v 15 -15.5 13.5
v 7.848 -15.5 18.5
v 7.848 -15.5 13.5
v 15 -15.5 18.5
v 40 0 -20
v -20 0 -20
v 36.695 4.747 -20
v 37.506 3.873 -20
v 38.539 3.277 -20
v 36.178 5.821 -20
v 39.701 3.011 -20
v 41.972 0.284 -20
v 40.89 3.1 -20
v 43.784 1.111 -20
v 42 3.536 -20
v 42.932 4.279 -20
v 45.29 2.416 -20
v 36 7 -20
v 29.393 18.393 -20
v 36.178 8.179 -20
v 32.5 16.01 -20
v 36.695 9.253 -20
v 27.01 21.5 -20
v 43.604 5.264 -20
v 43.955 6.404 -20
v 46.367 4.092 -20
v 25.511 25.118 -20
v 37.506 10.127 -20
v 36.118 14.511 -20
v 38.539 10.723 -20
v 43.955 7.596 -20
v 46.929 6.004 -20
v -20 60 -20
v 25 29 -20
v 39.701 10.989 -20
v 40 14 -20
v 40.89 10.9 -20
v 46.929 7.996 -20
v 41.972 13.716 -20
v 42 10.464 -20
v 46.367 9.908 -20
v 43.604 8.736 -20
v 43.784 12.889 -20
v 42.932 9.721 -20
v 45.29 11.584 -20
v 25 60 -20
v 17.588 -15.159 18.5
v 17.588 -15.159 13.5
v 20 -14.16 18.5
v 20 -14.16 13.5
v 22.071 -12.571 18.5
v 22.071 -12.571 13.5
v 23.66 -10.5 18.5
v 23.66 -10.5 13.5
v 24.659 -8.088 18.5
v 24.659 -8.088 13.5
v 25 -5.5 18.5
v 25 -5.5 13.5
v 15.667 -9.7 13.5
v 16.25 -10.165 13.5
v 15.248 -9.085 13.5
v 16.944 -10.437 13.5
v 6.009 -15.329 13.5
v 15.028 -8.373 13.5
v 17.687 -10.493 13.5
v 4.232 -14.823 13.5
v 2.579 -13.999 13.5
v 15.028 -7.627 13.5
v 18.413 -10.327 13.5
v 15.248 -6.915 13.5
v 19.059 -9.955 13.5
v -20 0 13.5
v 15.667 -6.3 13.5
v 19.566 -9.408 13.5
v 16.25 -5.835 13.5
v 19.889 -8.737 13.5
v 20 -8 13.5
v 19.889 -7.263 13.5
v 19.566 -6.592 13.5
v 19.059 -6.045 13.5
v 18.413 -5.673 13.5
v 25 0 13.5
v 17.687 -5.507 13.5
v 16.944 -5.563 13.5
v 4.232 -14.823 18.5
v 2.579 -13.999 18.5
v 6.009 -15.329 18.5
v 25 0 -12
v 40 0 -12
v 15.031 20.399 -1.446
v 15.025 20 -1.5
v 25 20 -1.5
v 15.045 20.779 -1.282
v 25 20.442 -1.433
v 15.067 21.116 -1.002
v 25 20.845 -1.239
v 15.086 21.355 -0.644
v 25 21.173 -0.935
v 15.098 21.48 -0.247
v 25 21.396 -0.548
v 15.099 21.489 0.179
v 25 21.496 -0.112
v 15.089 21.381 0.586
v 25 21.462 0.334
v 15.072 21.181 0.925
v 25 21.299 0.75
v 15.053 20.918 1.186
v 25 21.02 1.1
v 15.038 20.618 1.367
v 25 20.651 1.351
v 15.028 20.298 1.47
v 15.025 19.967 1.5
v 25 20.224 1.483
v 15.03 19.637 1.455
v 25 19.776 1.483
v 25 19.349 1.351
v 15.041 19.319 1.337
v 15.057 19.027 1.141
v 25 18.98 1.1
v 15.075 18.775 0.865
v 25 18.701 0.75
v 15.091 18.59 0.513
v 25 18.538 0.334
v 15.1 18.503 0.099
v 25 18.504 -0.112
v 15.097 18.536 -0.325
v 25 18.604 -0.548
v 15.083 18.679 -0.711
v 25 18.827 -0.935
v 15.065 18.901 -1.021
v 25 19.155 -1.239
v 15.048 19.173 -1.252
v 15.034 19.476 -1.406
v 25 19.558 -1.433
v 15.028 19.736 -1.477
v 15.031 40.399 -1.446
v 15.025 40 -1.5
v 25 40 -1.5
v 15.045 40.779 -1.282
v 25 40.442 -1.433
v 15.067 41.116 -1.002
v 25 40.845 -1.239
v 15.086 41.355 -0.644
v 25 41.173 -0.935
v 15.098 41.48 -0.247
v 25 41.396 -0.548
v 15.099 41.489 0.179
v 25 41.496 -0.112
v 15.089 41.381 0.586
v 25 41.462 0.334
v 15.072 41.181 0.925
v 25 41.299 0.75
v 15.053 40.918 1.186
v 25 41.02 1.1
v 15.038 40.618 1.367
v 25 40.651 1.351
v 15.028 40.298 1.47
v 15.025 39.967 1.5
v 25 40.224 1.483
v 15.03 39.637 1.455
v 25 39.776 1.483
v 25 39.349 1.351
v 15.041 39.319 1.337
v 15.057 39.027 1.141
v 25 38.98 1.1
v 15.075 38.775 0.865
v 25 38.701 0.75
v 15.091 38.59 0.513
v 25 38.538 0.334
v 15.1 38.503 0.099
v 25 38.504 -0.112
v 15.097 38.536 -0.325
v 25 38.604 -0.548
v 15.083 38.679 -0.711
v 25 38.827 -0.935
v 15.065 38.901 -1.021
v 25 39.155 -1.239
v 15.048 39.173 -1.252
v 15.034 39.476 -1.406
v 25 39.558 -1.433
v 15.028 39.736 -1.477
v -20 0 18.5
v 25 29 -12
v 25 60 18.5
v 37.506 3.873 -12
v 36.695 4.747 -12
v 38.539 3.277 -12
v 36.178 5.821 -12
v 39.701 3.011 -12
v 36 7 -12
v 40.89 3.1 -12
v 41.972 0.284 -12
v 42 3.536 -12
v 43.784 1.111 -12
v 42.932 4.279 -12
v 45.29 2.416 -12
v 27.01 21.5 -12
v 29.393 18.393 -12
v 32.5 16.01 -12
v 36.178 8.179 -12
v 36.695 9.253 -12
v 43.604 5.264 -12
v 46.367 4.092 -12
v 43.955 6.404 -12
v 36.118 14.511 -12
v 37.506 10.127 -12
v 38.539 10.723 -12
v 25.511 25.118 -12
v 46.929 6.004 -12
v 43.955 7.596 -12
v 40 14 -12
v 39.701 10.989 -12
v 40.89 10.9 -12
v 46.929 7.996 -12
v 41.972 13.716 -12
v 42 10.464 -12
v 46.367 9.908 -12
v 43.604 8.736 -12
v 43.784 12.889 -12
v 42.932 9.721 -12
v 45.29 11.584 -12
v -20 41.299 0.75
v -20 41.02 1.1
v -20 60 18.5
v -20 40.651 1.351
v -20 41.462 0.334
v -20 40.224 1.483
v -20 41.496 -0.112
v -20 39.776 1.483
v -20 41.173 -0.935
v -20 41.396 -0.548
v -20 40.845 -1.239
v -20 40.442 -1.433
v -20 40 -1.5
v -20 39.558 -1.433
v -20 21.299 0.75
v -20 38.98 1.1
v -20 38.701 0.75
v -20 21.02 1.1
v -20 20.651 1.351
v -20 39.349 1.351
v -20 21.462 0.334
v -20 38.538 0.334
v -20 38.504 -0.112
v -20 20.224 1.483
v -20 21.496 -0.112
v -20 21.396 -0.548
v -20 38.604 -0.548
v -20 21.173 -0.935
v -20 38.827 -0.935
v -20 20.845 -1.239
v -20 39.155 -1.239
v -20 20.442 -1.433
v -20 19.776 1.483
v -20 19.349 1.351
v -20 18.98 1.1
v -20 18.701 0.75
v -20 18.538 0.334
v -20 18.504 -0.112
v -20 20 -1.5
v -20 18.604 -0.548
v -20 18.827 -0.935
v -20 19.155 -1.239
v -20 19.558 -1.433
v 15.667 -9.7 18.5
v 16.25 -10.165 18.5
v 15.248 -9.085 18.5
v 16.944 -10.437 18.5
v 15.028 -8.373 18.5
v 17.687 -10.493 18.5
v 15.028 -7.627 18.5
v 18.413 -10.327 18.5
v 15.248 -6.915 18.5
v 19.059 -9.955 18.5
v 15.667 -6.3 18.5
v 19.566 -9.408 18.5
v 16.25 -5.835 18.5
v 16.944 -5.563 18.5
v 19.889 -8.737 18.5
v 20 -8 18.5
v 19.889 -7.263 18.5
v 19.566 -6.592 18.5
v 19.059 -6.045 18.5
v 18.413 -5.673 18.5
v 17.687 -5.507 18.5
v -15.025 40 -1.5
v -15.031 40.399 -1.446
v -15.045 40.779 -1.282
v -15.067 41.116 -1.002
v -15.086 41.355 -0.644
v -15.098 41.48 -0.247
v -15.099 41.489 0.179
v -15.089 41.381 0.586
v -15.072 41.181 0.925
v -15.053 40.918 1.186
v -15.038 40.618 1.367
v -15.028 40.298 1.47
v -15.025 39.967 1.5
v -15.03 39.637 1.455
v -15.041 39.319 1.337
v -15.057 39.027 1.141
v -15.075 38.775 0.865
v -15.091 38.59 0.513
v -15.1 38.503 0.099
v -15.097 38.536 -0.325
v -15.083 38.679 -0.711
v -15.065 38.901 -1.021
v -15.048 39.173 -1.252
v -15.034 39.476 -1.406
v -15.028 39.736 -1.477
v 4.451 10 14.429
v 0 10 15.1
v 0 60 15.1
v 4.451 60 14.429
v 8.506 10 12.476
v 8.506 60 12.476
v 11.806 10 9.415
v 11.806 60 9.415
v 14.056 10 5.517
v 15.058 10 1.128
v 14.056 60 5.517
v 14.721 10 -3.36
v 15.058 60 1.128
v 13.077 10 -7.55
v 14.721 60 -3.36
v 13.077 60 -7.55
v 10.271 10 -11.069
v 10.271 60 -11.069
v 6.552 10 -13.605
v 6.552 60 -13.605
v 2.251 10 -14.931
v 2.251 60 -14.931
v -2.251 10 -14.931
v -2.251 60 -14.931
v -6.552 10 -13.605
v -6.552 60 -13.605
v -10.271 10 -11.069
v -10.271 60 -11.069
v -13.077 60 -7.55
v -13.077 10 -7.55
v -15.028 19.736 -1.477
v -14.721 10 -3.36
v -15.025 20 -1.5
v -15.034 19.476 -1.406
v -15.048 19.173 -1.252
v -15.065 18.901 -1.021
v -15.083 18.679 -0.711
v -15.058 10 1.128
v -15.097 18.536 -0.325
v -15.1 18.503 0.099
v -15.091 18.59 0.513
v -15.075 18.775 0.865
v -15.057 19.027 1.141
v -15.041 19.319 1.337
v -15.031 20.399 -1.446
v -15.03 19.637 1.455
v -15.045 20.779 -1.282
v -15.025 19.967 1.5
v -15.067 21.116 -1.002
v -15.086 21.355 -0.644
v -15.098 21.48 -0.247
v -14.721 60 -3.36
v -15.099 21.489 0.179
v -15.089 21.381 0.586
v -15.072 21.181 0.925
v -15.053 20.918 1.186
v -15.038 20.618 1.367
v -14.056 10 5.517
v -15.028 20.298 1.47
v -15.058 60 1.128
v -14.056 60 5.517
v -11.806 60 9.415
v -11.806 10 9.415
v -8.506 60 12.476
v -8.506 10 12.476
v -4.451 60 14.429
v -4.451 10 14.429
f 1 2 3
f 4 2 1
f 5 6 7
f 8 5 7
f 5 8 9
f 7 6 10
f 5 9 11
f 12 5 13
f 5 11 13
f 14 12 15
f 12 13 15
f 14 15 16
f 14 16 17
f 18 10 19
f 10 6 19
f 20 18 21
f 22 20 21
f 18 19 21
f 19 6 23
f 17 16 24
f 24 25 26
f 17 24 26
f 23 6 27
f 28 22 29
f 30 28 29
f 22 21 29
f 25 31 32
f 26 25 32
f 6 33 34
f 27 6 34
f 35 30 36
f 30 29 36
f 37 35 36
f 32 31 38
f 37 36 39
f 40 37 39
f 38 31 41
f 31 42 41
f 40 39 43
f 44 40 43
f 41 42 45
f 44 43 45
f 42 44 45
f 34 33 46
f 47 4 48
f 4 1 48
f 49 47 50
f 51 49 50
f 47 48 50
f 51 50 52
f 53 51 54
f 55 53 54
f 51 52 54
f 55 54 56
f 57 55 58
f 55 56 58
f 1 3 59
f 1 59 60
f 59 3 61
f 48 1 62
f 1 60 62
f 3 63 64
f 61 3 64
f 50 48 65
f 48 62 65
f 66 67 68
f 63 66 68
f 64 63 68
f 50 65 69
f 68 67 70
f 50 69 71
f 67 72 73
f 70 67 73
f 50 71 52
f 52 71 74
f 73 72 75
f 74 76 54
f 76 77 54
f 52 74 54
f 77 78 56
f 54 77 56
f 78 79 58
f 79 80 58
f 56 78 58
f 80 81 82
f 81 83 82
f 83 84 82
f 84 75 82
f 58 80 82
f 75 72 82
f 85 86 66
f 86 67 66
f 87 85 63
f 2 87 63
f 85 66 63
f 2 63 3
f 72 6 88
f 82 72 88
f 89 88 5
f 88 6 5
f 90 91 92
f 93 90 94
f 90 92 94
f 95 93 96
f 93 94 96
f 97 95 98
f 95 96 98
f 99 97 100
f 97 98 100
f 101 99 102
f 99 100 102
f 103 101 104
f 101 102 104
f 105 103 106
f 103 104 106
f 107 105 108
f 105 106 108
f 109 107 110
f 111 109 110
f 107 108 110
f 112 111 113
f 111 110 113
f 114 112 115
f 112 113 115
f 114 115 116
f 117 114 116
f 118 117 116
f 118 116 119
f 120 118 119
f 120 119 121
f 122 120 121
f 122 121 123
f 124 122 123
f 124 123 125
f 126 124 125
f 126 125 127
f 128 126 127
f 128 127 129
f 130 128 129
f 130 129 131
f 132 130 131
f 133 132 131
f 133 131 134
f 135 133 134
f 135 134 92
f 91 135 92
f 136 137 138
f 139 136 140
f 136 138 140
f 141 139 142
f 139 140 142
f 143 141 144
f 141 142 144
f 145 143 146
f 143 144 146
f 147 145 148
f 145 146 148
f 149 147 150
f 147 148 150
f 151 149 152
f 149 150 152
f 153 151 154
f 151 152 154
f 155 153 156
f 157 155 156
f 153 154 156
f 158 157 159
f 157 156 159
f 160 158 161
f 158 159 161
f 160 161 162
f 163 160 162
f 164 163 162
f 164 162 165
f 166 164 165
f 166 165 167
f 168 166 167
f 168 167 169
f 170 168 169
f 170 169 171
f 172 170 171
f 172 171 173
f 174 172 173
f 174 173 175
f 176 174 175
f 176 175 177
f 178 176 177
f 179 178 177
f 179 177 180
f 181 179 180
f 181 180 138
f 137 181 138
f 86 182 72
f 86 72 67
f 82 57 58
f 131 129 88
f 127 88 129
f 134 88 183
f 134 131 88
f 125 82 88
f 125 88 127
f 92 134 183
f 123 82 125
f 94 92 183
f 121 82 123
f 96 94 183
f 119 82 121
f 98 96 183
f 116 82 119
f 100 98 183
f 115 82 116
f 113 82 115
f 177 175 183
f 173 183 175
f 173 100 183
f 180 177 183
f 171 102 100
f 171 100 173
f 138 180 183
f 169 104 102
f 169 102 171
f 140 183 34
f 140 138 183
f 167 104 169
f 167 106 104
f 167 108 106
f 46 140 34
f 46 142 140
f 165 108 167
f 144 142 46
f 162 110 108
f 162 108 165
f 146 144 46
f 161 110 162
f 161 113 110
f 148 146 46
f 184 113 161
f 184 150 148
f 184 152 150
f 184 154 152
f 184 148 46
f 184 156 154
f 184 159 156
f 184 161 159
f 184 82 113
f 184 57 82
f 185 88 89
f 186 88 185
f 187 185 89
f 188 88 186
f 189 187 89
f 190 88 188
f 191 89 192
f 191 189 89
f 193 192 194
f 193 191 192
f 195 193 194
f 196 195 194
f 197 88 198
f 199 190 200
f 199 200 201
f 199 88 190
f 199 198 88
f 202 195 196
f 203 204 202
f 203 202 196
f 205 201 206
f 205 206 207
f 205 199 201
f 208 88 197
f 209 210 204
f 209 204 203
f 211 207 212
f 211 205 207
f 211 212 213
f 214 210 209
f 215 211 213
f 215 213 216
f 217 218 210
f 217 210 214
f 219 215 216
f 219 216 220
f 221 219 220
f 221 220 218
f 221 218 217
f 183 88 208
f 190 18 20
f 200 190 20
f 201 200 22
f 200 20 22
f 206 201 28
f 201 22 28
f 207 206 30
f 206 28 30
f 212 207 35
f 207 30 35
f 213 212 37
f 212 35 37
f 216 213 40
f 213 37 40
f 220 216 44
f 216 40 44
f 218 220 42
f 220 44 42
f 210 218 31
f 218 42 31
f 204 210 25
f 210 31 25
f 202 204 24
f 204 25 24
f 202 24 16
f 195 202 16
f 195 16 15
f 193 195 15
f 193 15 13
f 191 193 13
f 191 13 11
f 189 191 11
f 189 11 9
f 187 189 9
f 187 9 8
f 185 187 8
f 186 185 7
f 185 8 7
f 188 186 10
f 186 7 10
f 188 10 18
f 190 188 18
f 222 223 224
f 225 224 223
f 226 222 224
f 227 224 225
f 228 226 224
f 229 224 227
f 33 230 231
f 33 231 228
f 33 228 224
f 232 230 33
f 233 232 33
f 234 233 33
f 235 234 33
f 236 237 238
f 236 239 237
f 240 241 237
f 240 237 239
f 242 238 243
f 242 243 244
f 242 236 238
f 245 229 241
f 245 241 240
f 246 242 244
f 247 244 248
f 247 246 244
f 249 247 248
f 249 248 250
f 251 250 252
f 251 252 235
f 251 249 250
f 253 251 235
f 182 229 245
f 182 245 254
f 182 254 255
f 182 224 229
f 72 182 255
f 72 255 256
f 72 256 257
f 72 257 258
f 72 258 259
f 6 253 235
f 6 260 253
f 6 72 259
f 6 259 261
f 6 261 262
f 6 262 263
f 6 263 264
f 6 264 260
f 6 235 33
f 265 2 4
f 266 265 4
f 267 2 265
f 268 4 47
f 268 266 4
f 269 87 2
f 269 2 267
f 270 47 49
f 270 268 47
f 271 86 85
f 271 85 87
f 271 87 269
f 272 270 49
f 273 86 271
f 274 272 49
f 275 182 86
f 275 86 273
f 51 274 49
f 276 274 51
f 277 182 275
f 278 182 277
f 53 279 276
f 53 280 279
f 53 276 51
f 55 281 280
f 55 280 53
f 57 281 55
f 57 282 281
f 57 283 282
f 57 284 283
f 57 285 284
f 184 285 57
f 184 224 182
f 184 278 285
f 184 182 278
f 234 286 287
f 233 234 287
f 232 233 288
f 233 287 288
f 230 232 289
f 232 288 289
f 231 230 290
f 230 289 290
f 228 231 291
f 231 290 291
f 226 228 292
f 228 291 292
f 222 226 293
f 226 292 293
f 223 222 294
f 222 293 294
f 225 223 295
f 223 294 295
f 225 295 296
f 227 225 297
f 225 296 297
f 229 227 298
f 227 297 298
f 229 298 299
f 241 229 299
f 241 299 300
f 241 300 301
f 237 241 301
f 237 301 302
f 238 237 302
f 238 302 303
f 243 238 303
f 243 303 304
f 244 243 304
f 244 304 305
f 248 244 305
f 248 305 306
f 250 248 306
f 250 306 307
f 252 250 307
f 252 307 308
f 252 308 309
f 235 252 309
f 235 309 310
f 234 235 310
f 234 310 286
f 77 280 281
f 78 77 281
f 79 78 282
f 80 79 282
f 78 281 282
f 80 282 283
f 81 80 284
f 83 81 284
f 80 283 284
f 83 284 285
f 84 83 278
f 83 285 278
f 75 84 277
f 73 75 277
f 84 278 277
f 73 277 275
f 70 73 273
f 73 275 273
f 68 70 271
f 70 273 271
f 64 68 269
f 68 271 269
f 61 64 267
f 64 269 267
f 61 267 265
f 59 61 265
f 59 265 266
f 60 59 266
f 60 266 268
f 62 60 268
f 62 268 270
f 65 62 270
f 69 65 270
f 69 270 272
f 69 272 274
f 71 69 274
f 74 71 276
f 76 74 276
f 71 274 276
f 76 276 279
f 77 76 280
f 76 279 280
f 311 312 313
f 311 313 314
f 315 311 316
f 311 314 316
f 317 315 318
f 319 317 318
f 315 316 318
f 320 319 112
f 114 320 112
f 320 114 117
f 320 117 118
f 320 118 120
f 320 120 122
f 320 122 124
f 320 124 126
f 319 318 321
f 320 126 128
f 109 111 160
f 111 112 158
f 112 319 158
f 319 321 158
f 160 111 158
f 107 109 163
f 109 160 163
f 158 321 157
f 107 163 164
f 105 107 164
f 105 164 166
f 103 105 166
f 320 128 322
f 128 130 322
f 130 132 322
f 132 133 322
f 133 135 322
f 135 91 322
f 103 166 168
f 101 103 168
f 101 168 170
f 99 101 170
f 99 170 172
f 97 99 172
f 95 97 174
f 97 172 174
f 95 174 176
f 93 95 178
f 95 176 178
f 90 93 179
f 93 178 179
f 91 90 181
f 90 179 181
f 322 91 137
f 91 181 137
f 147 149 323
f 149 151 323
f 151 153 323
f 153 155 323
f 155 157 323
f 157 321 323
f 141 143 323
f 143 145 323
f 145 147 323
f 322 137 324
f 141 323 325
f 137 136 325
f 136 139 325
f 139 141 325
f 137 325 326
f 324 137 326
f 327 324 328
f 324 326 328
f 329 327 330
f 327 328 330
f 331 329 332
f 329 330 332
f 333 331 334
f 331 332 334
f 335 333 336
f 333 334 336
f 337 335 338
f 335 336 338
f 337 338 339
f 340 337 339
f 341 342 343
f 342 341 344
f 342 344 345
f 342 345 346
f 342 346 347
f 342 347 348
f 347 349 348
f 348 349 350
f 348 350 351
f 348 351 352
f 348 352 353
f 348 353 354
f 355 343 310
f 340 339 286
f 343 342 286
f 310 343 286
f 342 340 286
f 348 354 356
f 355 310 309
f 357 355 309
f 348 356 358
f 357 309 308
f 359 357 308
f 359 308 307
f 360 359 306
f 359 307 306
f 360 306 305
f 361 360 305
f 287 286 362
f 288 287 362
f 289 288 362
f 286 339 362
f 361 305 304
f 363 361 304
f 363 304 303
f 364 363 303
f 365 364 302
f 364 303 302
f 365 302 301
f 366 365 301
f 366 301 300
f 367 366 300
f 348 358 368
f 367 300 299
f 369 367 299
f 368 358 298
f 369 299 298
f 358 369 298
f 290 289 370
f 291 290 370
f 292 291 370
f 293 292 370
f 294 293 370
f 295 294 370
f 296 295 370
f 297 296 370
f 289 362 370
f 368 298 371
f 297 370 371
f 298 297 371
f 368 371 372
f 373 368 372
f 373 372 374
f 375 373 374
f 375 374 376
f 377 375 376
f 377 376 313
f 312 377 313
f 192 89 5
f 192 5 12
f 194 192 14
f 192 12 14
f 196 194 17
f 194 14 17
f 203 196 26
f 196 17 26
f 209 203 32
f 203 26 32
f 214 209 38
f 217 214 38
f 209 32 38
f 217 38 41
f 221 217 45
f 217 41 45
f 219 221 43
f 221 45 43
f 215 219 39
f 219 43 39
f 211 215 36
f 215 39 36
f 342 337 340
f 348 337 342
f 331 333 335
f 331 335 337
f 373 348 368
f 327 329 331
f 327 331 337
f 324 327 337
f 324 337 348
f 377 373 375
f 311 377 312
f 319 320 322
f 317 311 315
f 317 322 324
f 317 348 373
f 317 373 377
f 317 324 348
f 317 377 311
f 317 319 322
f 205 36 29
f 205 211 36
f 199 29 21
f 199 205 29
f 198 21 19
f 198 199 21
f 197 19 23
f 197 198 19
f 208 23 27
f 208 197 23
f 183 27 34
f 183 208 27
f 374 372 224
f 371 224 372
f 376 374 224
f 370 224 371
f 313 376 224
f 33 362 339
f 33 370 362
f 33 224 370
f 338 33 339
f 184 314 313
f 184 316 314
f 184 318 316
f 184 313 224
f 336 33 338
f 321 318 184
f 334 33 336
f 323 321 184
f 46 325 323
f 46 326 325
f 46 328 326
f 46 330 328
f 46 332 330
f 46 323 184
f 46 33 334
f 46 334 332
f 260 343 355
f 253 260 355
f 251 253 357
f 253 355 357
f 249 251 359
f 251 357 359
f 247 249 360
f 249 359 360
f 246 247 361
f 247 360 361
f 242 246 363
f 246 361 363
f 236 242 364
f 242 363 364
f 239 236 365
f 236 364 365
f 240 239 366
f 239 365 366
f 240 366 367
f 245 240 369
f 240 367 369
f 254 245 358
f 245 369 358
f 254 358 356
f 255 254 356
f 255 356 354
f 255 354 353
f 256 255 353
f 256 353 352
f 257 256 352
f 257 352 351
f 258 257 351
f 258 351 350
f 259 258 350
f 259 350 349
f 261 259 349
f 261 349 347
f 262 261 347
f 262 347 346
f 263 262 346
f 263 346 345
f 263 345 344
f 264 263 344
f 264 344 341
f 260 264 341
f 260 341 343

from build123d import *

# Parameters (mm, degrees)
SKETCH_1_W             = 45
SKETCH_1_H             = 38.5
EXTRUDE_1_DEPTH        = 60
SKETCH_2_R             = 15.1
CUT_EXTRUDE_1_DEPTH    = 50
SKETCH_3_R             = 2.5
EXTRUDE_2_DEPTH        = 5
SKETCH_4_R             = 1.5
CUT_EXTRUDE_2_DEPTH    = 78.620873481
PATTERN_LINEAR_1_COUNT = 2
PATTERN_LINEAR_1_PITCH = 20
FILLET_1_R             = 10
SKETCH_5_R             = 4
EXTRUDE_3_DEPTH        = 8
FILLET_2_R             = 15


with BuildPart() as part:
    # 草圖1 → 填料-伸長1 (new body)
    with BuildSketch(Plane(origin=(0, 0, 0), x_dir=(1, 0, 0), z_dir=(0, 1, 0))):
        with Locations((2.5, 0.75)):
            Rectangle(SKETCH_1_W, SKETCH_1_H)
    extrude(amount=EXTRUDE_1_DEPTH)

    # 草圖2 → 除料-伸長1 (cut)
    with BuildSketch(Plane(origin=(0, 60, 0), x_dir=(1, 0, 0), z_dir=(0, 1, 0))):
        with Locations(Location((0, 0, 0), (0, 0, 270))):
            Circle(SKETCH_2_R)
    extrude(amount=-CUT_EXTRUDE_1_DEPTH, mode=Mode.SUBTRACT)

    # 草圖3 → 填料-伸長2 (add)
    with BuildSketch(Plane.XY.offset(18.5)):
        Polygon((-20, 0), (5, -15.5), (25, -15.5), (25, 0), align=None)
        with Locations((17.5, -8)):
            Circle(SKETCH_3_R, mode=Mode.SUBTRACT)
    extrude(amount=-EXTRUDE_2_DEPTH)

    # 草圖4 → 除料-伸長2 (cut, through all)
    with BuildSketch(Plane(origin=(25, 0, 0), x_dir=(0, 0, -1), z_dir=(1, 0, 0))):
        with Locations((0, 20)):
            Circle(SKETCH_4_R)
    cut_extrude_2 = extrude(amount=-CUT_EXTRUDE_2_DEPTH, mode=Mode.SUBTRACT)

    # 直線複製排列1: 除料-伸長2 ×2
    with Locations(*[(0, i * PATTERN_LINEAR_1_PITCH, 0) for i in range(1, PATTERN_LINEAR_1_COUNT)]):
        add(cut_extrude_2, mode=Mode.SUBTRACT)

    # 圓角1
    fillet_1_edges = [part.edges().sort_by_distance(p)[0] for p in [
        (25, -15.5, 16),
        (5, -15.5, 16),
    ]]
    fillet(fillet_1_edges, radius=FILLET_1_R)

    # 草圖5 → 填料-伸長3 (add)
    with BuildSketch(Plane(origin=(0, 0, -20), x_dir=(-1, 0, 0), z_dir=(0, 0, -1))):
        with BuildLine():
            Line((-25, 0), (-40, 0))
            ThreePointArc((-40, 0), (-47, 7), (-40, 14))
            Line((-40, 14), (-25, 14))
            Line((-25, 14), (-25, 0))
        make_face()
        with Locations((-40, 7)):
            Circle(SKETCH_5_R, mode=Mode.SUBTRACT)
    extrude(amount=-EXTRUDE_3_DEPTH)

    # 圓角2
    fillet_2_edges = [part.edges().sort_by_distance(p)[0] for p in [
        (25, 14, -16),
    ]]
    fillet(fillet_2_edges, radius=FILLET_2_R - 0.0001)  # a hair under: the kernel refuses the full size


solid = part.part
